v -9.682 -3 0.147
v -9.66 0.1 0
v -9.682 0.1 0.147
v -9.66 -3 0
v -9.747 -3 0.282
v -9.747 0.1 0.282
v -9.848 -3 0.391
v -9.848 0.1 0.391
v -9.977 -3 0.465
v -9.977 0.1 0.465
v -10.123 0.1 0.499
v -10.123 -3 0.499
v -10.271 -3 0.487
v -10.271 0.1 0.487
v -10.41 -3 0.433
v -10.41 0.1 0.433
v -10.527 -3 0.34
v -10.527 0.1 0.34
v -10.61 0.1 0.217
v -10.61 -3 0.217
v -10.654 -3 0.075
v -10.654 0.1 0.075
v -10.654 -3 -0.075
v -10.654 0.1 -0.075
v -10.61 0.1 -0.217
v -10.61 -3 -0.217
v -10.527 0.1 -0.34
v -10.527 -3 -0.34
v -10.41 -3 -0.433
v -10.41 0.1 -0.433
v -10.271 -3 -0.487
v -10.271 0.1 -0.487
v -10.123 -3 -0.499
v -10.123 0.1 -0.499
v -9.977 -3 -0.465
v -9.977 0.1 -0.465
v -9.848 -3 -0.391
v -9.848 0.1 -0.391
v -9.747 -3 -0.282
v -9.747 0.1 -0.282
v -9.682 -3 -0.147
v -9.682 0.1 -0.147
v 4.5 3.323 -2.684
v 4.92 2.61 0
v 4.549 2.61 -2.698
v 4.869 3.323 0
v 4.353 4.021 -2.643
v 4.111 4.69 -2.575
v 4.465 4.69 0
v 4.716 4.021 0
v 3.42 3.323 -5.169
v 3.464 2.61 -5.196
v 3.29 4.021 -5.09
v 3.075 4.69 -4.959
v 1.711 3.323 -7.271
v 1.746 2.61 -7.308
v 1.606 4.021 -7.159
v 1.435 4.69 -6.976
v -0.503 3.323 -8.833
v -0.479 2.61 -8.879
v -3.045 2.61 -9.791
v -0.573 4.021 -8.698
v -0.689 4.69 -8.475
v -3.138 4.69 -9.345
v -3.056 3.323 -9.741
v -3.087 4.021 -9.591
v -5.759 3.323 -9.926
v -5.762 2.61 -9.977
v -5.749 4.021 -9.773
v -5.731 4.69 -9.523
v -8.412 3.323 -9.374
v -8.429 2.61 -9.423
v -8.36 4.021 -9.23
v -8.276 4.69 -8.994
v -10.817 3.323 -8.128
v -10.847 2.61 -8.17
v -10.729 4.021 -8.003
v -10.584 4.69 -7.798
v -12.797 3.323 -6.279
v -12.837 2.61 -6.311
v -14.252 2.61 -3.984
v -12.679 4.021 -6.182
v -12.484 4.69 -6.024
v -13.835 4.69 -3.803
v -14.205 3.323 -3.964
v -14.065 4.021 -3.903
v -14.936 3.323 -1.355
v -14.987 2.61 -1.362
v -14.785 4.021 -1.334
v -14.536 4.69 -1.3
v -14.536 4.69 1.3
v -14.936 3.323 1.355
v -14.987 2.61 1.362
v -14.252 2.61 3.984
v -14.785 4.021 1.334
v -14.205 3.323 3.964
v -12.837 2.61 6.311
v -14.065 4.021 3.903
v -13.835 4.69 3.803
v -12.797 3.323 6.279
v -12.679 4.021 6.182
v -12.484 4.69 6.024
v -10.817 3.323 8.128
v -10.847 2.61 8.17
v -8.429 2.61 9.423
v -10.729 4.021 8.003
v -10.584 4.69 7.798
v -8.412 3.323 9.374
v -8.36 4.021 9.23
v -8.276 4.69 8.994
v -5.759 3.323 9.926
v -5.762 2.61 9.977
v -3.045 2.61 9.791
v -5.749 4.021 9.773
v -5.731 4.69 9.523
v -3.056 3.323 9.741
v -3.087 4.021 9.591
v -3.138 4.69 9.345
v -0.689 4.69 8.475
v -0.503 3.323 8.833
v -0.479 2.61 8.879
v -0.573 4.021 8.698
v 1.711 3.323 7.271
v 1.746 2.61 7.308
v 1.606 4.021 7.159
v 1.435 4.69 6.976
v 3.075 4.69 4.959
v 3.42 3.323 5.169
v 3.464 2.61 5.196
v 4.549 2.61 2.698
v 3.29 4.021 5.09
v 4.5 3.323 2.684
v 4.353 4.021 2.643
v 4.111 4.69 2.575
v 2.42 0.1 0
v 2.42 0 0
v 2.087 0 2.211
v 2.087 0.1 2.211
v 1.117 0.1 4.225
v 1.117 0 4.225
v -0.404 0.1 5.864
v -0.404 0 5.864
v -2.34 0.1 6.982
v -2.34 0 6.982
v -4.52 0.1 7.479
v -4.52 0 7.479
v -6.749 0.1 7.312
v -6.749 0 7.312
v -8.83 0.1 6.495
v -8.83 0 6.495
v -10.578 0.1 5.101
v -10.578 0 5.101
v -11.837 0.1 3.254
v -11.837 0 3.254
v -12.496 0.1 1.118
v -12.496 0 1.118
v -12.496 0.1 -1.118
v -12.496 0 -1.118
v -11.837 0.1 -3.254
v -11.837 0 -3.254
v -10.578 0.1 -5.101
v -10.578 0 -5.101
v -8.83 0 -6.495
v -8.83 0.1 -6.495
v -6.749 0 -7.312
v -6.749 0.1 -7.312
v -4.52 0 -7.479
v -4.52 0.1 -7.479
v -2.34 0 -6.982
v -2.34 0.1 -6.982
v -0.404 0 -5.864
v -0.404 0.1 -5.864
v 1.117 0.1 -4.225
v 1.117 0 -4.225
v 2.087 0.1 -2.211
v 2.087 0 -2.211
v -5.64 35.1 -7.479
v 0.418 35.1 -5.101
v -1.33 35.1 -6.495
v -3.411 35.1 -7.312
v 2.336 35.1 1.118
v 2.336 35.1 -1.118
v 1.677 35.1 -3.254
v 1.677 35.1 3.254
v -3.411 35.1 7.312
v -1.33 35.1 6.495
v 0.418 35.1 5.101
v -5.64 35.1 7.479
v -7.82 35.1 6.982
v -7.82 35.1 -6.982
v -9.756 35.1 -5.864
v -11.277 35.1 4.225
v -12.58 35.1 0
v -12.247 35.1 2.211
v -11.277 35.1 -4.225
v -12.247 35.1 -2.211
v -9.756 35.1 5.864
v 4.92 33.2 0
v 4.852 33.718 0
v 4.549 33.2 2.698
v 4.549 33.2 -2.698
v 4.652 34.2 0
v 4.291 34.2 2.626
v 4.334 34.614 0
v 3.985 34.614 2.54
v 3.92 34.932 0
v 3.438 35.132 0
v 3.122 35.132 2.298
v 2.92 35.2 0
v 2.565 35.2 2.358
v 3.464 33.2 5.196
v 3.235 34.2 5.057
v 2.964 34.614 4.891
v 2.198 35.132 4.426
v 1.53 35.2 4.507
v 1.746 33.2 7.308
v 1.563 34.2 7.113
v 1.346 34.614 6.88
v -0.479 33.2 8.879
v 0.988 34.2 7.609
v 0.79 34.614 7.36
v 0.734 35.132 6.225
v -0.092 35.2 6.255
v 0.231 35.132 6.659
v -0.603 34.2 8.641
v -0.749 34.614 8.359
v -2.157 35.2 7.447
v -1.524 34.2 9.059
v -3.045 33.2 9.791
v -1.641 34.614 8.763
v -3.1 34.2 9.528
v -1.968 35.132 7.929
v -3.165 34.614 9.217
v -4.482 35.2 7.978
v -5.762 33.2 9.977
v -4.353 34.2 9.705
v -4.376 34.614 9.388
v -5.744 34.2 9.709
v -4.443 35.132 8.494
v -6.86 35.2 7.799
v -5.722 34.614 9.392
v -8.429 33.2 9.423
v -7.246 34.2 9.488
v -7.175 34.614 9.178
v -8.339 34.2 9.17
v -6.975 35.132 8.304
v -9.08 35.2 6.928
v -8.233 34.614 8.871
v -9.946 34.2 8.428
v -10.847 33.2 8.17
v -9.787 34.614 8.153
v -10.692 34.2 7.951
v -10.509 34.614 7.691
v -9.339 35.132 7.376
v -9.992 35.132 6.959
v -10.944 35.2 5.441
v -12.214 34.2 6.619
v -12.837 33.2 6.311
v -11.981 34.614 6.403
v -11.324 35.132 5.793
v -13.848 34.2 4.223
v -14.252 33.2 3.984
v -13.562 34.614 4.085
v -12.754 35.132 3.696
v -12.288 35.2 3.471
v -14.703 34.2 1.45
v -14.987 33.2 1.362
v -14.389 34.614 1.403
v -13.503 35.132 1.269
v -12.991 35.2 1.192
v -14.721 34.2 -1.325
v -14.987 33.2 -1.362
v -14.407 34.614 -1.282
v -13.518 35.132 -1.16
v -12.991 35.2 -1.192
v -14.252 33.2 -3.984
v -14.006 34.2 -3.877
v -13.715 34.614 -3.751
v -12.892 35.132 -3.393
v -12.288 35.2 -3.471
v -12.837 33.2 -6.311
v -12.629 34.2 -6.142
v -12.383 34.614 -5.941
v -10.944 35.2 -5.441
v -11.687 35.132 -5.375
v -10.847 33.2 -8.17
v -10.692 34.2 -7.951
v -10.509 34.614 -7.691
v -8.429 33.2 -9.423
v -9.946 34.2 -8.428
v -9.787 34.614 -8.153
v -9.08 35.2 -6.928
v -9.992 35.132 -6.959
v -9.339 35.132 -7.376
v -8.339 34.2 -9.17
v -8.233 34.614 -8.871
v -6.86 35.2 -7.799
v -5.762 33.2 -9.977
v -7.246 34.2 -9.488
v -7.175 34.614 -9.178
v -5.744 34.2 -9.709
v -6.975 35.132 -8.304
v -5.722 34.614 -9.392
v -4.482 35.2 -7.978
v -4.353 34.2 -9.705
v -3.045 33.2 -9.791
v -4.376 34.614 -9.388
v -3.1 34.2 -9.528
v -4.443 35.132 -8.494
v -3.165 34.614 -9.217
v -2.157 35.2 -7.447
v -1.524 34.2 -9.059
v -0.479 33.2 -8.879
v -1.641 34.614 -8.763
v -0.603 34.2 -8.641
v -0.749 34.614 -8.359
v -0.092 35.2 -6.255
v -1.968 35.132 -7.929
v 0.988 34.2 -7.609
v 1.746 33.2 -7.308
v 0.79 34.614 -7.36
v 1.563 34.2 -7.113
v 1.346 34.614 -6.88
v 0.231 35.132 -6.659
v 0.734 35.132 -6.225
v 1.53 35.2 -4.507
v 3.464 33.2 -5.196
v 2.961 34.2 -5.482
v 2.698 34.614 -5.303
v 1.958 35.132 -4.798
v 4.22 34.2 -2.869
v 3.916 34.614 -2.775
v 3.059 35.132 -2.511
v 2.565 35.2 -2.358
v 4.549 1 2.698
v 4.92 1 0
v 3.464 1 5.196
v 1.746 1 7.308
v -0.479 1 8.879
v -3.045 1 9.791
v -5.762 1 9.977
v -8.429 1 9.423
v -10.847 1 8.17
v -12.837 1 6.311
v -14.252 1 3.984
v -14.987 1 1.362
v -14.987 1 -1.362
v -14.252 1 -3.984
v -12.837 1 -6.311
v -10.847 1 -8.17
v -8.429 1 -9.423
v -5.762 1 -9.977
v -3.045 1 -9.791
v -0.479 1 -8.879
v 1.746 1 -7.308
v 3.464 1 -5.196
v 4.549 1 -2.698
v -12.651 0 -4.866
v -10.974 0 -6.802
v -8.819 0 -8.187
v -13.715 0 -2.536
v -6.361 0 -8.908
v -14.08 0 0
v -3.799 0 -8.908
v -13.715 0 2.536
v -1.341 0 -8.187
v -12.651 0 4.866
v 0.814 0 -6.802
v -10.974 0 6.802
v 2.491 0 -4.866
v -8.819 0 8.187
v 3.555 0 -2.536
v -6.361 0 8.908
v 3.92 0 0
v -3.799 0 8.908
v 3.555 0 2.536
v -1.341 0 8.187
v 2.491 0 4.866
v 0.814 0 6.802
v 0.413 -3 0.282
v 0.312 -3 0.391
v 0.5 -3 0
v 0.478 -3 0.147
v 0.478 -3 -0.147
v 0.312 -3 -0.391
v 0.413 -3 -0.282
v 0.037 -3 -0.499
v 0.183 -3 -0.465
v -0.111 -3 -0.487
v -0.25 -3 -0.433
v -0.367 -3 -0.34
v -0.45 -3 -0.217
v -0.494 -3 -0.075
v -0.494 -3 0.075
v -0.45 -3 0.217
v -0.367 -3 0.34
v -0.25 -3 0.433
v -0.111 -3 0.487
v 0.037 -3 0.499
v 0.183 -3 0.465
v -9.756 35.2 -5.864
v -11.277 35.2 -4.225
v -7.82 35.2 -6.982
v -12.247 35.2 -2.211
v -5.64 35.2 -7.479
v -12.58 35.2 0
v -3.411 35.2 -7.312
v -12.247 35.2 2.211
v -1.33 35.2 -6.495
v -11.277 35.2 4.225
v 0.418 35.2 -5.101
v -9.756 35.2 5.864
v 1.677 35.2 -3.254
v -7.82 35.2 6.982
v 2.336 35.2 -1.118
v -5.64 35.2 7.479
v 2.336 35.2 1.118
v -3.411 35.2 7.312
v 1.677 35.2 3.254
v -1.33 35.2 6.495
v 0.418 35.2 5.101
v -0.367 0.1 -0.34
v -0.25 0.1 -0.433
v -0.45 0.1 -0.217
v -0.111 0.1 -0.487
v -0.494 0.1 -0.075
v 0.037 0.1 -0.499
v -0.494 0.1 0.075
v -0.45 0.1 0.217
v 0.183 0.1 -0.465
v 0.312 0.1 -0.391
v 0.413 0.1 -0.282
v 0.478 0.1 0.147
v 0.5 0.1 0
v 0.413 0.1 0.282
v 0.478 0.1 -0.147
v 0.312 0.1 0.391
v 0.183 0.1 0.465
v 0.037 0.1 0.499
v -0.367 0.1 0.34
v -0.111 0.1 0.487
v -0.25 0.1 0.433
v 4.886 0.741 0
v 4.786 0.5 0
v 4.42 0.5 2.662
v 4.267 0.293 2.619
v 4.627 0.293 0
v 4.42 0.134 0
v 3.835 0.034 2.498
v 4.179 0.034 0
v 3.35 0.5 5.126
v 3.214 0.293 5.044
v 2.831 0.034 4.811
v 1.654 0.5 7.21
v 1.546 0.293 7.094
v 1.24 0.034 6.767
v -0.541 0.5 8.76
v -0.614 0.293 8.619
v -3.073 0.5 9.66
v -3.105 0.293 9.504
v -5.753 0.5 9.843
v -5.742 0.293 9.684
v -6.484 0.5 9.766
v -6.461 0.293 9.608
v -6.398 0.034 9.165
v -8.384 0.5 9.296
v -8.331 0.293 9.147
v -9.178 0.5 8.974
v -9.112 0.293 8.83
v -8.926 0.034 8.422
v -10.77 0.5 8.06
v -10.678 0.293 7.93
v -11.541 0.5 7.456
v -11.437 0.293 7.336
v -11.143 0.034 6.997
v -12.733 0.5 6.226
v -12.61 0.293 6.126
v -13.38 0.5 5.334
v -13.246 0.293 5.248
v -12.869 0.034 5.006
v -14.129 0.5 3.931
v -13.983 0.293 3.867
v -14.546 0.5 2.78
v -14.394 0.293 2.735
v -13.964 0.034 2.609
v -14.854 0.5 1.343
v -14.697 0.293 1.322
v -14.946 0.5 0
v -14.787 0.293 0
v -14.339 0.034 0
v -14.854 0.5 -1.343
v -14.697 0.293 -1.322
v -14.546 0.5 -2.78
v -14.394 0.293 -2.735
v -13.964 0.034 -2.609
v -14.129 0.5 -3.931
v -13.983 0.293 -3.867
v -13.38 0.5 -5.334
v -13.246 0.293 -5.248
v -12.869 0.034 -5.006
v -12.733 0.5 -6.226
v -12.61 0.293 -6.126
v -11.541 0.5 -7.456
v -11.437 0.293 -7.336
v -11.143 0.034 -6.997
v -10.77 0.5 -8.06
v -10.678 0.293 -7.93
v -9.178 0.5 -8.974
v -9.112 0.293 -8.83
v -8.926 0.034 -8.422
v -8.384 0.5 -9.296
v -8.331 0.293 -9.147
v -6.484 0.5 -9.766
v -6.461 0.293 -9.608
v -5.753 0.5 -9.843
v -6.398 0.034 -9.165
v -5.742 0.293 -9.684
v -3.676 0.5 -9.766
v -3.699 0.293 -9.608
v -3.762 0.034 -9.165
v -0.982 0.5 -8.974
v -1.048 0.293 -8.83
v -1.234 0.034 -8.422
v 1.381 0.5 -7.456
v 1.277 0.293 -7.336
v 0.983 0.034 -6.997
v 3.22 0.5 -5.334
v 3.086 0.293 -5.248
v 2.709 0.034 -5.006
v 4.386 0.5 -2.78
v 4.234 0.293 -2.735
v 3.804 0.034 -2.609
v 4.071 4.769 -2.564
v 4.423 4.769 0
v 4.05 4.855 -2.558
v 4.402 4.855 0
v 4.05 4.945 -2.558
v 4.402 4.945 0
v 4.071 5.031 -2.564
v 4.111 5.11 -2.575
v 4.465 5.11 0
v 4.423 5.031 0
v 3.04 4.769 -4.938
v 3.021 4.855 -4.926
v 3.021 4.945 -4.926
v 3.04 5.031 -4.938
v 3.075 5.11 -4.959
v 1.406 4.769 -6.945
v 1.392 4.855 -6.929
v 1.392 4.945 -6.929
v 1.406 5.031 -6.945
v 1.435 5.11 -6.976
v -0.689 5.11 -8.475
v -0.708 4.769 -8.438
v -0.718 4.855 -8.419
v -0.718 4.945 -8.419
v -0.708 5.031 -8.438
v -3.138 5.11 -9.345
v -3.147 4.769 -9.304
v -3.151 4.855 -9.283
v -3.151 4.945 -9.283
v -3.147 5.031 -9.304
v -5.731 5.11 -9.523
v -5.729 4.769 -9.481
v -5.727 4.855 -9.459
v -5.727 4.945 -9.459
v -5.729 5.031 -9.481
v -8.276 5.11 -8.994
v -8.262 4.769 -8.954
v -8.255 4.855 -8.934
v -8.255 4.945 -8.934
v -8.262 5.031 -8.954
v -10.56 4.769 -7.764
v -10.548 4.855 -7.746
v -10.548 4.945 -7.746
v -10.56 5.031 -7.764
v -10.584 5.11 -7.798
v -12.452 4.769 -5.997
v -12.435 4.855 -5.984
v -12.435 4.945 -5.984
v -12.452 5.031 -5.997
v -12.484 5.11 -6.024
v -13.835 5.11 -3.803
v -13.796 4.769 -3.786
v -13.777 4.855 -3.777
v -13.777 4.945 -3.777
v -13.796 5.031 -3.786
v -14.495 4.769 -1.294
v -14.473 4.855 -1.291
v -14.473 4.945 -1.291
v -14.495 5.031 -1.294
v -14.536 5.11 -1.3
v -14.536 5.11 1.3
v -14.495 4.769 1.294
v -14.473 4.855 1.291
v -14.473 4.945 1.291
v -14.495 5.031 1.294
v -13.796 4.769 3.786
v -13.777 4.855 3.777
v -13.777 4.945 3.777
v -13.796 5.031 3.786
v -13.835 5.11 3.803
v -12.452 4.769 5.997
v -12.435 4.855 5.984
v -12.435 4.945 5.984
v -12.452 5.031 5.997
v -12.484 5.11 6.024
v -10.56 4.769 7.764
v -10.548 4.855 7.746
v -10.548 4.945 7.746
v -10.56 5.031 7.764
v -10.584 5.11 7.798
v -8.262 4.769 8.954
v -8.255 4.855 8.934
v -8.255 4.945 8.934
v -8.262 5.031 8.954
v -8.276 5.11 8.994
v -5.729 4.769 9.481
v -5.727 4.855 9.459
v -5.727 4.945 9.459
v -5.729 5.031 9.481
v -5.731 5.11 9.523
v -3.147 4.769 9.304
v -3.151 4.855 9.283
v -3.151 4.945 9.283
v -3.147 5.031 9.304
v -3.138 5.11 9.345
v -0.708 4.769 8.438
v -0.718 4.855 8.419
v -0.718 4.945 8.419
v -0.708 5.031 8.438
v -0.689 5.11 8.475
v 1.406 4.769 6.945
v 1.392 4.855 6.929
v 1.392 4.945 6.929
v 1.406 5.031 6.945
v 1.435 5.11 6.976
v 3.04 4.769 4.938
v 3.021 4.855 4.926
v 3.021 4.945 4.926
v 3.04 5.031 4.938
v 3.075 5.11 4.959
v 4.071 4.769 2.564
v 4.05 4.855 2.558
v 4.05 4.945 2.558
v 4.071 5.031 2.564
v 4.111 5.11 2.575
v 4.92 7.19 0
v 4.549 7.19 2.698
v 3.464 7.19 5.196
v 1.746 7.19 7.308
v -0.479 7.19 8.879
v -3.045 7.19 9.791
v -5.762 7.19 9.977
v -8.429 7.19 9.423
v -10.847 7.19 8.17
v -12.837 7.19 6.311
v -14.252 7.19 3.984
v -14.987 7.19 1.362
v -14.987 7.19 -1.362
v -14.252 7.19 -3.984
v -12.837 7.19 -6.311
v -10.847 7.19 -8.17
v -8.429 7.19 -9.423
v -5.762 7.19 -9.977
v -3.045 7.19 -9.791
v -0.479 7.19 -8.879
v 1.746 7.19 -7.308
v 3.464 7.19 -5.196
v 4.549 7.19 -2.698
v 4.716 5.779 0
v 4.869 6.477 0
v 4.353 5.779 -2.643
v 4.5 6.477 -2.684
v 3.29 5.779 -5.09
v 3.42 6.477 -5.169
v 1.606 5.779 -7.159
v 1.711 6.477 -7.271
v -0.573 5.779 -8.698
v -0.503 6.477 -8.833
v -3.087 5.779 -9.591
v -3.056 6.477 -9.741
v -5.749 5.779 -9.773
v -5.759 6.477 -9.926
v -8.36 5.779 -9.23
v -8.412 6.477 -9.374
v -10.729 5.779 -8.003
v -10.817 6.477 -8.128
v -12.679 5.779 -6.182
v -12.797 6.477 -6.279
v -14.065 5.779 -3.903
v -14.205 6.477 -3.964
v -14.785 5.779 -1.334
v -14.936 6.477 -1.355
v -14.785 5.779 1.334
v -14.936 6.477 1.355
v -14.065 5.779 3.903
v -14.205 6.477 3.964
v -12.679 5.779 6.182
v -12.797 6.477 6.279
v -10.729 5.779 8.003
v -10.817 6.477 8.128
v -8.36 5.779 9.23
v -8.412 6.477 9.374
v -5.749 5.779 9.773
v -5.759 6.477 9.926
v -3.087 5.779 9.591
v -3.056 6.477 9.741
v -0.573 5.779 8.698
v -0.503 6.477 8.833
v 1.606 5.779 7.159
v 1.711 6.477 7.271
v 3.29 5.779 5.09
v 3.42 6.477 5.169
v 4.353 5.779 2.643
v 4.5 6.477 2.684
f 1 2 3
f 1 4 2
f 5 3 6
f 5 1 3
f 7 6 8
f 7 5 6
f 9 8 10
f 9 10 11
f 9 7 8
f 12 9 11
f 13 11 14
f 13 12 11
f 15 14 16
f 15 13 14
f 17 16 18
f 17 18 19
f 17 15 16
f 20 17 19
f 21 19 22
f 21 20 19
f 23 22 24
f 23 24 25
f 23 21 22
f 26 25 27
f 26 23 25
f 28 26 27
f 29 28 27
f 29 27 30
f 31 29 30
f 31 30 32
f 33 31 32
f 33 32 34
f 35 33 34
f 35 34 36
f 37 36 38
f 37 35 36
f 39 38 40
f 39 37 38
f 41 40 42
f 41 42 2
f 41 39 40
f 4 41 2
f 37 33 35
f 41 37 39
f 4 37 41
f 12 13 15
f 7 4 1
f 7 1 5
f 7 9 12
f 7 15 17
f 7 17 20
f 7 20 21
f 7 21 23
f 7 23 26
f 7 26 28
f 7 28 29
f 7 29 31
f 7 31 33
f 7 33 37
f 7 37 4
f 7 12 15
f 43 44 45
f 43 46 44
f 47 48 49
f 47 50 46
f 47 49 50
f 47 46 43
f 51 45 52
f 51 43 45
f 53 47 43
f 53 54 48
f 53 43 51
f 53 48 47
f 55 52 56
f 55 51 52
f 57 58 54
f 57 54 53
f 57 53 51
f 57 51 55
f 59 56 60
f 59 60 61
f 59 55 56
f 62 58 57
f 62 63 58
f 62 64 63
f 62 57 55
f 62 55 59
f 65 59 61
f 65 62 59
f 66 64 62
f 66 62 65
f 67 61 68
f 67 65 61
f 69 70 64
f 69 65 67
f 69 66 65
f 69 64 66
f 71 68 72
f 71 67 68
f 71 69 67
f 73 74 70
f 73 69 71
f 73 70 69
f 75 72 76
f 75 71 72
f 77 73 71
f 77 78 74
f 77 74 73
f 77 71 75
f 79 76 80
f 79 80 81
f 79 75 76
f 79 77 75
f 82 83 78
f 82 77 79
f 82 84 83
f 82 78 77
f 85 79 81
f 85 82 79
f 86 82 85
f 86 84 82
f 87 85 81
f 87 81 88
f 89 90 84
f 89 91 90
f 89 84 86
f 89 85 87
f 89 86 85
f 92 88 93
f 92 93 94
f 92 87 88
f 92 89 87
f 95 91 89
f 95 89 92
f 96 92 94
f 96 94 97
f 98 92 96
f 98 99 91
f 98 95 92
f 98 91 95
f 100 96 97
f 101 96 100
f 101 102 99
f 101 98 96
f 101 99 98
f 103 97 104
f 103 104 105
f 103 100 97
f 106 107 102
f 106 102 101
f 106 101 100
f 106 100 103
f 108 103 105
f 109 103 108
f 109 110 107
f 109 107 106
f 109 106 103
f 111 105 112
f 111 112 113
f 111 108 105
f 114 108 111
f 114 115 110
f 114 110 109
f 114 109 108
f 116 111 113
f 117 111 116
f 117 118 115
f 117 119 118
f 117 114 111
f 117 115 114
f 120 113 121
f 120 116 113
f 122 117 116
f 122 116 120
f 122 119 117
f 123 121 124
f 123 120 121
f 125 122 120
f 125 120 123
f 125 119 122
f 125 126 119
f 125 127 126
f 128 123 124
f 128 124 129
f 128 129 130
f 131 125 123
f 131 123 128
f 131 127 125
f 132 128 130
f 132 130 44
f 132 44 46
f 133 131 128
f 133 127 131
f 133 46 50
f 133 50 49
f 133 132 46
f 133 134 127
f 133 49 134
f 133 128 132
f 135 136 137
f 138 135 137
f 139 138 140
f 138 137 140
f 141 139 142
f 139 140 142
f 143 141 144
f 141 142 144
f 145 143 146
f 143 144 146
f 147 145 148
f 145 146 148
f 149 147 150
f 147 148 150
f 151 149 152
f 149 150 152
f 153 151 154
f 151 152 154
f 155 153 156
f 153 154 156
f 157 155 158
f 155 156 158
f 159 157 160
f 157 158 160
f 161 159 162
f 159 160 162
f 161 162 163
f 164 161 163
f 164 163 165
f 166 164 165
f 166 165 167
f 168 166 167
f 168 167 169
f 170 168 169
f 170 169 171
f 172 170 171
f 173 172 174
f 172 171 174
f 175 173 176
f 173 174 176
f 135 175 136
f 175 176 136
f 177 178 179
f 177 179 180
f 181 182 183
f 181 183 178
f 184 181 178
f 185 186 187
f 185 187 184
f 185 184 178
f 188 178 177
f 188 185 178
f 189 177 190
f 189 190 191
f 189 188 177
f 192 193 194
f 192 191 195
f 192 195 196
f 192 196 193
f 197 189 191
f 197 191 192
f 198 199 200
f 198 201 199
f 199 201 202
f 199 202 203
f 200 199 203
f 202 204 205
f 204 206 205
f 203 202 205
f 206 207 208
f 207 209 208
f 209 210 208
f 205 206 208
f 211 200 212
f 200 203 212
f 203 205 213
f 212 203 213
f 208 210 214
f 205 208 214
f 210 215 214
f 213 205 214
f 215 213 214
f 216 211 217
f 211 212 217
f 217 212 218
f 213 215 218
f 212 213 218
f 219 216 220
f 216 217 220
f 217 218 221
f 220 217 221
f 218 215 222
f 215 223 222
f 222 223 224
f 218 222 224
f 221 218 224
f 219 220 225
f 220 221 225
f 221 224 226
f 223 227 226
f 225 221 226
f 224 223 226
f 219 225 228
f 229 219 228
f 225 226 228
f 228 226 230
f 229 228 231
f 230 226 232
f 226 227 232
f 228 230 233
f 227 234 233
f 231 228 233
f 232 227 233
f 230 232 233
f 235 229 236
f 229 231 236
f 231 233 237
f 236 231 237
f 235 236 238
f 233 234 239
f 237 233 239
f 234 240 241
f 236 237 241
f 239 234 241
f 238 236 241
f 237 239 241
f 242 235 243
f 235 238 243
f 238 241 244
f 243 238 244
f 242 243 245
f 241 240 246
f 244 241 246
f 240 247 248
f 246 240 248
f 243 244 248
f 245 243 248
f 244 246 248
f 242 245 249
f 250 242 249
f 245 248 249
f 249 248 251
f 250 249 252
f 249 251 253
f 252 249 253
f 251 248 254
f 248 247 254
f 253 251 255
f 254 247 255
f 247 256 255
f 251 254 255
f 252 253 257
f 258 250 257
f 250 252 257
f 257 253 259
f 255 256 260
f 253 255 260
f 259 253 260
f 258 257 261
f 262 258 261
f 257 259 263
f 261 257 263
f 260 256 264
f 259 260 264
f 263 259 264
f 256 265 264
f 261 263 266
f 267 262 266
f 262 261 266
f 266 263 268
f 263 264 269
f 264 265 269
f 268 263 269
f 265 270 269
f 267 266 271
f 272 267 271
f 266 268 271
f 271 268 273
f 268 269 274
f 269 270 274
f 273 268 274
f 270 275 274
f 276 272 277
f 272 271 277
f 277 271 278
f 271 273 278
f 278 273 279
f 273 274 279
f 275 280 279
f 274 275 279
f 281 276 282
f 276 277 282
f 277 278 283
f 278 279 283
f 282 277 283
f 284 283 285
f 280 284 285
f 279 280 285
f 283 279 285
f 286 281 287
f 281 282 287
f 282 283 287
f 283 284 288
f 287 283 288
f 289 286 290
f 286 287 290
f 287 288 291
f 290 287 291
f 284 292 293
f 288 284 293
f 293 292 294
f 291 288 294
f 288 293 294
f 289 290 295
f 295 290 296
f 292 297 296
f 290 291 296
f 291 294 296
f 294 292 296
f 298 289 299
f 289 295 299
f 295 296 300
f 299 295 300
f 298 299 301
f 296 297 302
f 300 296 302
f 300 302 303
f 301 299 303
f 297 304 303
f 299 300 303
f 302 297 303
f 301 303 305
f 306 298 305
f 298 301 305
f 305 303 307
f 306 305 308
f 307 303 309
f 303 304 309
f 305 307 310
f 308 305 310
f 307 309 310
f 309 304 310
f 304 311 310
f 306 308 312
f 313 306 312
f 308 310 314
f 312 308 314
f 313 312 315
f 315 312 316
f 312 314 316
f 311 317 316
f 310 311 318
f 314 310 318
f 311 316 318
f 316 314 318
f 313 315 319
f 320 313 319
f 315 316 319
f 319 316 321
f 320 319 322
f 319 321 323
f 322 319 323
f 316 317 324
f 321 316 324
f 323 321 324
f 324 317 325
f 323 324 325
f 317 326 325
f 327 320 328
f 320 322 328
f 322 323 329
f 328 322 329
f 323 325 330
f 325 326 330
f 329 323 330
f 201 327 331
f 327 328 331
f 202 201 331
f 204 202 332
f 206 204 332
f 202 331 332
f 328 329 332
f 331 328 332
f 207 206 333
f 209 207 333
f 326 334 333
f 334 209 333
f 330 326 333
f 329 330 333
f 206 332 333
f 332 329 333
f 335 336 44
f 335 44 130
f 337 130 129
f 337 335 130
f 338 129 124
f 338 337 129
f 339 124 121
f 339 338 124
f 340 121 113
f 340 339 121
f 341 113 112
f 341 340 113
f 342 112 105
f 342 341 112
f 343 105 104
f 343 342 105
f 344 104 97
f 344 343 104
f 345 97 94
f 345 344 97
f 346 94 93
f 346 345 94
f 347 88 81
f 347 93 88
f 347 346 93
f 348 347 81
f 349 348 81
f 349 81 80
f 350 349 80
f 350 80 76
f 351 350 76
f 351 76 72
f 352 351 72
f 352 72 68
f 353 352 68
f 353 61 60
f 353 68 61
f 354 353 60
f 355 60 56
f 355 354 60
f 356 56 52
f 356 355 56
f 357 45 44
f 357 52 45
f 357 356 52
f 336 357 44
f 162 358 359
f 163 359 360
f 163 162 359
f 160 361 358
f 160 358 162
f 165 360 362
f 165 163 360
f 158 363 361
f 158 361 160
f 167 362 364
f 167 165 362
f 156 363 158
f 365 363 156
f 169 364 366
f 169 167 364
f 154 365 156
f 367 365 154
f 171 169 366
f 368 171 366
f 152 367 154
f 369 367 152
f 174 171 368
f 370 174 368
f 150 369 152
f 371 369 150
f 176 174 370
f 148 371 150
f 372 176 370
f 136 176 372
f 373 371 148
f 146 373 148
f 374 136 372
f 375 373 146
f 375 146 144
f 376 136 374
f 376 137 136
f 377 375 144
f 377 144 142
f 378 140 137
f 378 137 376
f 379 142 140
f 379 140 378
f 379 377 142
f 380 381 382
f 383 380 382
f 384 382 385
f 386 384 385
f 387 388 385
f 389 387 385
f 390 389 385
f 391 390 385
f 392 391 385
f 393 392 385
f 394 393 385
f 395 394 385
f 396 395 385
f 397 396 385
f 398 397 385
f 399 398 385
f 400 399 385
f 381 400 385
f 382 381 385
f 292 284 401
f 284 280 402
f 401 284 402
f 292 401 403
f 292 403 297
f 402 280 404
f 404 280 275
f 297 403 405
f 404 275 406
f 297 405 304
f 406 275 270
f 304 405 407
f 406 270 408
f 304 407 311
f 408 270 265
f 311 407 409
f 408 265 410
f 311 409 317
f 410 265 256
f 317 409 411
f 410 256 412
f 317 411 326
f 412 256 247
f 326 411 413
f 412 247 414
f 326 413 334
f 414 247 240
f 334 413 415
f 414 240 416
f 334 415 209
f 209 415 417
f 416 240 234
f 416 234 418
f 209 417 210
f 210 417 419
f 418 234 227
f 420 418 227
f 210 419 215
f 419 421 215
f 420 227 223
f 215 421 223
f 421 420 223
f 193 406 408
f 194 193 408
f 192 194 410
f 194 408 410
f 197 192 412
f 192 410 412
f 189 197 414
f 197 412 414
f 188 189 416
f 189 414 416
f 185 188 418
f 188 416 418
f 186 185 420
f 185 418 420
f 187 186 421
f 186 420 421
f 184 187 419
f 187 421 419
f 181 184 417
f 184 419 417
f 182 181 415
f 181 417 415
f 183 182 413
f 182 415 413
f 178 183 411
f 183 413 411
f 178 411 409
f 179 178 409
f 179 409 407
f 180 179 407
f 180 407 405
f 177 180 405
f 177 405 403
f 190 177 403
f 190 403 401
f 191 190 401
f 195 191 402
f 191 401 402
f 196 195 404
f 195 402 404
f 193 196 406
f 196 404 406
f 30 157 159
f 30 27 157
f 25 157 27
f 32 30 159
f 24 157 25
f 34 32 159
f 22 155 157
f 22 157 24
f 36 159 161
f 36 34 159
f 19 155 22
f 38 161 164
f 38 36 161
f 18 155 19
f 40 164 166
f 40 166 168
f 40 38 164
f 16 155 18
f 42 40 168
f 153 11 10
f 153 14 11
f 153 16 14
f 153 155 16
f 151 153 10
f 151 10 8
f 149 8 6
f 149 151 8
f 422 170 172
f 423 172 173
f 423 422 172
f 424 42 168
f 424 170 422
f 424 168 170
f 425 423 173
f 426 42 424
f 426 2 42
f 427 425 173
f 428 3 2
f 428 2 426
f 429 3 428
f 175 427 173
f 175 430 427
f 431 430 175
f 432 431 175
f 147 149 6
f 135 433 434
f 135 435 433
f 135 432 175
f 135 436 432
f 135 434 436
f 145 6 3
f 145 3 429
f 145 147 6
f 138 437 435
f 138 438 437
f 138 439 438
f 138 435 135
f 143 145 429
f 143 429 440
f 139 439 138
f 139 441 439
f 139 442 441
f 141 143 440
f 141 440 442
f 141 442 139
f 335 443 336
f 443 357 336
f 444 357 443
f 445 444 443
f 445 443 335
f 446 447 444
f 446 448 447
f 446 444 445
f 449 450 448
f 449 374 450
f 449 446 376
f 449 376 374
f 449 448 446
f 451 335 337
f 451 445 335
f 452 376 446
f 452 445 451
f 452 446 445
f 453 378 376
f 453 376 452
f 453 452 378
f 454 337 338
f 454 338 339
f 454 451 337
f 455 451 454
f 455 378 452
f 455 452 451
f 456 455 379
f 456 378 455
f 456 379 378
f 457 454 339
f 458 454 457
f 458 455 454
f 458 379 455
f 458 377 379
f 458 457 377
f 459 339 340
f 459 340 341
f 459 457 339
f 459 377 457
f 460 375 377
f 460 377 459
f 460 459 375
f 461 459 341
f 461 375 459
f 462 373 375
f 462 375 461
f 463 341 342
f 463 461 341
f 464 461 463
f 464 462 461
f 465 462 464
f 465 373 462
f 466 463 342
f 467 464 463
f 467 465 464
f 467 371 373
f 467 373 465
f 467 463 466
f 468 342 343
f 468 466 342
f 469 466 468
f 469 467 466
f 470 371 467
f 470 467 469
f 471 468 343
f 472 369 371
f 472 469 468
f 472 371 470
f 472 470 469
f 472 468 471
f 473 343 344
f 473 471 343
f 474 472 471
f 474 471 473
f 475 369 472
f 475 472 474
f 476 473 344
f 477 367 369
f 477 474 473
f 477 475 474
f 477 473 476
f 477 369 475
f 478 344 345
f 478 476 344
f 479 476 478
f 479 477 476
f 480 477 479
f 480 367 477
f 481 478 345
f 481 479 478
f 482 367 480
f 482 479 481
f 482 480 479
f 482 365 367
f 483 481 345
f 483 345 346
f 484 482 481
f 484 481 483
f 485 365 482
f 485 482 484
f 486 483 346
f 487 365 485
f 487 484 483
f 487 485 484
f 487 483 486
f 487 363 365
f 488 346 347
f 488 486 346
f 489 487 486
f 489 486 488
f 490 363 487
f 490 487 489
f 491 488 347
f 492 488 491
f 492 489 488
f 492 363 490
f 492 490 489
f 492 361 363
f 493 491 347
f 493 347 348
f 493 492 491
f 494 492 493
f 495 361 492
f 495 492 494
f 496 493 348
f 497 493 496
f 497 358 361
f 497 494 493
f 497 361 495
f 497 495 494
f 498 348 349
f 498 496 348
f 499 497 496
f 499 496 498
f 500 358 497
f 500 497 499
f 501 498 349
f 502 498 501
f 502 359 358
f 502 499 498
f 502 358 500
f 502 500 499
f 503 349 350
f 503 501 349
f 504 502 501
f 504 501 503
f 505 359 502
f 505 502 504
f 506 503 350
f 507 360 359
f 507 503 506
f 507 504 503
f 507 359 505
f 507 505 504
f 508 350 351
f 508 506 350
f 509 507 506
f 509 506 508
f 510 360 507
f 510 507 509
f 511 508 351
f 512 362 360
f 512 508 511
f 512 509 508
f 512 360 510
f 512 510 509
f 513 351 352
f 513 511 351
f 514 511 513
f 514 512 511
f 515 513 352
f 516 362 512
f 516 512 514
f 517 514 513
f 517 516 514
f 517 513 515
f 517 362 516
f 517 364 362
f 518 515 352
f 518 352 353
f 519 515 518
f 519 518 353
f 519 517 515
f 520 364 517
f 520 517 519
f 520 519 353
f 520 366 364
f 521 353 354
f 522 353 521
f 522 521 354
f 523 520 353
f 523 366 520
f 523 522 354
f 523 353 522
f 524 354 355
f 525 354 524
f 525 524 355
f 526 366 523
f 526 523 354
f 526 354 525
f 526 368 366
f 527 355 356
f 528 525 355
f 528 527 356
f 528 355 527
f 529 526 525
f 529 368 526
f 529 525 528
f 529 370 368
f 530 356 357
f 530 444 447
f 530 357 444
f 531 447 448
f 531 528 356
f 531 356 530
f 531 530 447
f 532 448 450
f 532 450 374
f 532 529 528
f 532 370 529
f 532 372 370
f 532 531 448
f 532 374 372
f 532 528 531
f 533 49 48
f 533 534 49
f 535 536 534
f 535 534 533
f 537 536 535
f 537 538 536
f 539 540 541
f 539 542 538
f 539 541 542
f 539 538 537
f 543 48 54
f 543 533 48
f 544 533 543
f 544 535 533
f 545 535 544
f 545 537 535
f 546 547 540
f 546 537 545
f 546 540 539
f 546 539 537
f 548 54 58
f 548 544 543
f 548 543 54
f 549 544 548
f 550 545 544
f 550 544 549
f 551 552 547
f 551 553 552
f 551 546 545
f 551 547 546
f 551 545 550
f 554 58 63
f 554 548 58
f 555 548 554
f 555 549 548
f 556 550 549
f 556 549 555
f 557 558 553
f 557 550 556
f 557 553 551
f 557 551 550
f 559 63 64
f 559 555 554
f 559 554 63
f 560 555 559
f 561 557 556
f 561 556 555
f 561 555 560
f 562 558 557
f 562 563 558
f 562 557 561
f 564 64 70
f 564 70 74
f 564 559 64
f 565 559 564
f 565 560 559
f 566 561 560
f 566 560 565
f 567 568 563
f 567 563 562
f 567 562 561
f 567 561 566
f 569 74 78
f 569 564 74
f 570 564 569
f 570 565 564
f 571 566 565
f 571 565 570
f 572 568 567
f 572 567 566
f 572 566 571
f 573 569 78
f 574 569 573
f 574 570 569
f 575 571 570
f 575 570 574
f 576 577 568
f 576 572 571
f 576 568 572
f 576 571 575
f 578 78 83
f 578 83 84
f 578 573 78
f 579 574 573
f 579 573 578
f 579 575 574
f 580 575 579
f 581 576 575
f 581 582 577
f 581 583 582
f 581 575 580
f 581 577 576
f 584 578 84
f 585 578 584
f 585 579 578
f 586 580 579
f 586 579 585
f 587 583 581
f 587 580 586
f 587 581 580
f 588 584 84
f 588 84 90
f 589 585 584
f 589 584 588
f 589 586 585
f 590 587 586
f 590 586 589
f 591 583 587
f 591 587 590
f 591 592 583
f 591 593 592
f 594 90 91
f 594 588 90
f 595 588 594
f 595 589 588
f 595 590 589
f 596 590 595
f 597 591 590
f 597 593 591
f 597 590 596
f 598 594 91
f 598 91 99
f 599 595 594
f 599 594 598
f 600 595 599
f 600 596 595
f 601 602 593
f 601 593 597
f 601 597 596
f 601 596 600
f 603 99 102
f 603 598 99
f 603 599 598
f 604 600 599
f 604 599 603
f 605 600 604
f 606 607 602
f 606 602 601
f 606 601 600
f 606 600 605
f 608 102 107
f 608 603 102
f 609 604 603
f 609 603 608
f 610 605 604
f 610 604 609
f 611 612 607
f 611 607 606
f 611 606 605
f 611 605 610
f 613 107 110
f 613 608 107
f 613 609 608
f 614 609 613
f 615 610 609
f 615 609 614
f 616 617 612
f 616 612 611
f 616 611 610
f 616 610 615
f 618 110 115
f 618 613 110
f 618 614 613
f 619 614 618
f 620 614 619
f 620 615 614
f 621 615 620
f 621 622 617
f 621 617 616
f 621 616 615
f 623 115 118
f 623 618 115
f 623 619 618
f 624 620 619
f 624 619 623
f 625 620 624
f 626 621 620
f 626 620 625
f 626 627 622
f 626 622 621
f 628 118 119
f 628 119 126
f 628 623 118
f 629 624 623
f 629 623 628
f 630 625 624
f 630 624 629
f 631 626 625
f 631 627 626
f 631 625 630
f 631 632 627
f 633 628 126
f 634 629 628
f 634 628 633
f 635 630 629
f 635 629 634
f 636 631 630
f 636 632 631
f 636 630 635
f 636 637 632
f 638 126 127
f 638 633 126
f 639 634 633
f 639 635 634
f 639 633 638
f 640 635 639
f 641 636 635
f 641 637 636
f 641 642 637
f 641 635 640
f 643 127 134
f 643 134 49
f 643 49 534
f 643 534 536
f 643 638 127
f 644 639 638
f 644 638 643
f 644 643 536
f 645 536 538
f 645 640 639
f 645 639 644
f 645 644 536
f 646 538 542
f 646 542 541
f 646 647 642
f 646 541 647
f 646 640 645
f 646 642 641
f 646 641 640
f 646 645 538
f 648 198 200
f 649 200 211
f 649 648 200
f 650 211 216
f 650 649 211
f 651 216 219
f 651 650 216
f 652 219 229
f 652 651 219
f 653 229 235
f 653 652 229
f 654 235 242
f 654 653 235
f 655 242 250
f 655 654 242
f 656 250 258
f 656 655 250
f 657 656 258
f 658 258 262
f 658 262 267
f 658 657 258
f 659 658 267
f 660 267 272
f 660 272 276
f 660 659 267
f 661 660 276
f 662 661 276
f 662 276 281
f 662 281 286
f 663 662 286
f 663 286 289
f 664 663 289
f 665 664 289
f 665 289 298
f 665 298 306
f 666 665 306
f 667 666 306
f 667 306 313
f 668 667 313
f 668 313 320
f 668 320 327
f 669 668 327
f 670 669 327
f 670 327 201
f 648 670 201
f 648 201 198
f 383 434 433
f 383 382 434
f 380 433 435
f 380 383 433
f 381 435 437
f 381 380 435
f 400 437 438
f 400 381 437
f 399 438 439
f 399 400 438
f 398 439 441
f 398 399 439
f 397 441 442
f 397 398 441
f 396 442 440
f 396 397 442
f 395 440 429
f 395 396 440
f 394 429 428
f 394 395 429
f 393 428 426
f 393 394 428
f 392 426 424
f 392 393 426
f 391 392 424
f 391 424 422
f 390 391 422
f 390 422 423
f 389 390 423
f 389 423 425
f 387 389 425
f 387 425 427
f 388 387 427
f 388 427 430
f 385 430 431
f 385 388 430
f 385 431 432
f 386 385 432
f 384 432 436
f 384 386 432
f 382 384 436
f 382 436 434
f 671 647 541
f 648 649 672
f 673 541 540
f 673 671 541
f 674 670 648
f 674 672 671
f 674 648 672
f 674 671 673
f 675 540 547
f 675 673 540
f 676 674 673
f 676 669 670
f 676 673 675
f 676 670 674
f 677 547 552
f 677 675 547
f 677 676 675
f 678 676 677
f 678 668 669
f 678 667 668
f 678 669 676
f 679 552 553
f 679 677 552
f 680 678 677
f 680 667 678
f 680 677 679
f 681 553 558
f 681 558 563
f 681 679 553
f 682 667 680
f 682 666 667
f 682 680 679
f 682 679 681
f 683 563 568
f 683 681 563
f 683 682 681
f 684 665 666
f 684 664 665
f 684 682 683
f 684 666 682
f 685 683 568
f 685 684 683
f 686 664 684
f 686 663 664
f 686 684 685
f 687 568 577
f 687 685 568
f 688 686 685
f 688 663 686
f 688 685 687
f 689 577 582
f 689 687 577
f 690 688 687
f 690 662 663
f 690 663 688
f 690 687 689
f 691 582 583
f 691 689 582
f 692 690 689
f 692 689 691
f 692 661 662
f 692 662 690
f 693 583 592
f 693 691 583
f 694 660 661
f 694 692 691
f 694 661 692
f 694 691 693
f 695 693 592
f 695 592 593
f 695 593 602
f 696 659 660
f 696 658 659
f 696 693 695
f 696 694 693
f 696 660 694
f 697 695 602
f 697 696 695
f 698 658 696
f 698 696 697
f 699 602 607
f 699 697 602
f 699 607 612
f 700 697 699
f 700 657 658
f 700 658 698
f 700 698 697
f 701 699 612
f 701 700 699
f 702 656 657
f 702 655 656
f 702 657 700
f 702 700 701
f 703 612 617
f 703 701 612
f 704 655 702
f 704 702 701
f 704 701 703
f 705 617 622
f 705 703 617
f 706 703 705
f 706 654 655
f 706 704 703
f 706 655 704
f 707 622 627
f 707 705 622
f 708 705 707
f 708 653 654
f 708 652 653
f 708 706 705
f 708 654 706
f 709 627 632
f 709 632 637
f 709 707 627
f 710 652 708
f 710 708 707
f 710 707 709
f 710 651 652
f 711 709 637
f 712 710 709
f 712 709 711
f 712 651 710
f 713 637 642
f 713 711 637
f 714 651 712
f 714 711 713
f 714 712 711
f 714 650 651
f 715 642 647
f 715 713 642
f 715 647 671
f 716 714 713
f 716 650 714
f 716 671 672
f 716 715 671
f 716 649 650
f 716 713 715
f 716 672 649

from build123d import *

# Parameters (mm, degrees)
SKETCH1_R           = 0.5
BASE_EXTRUDE_DEPTH  = 3
SKETCH2_R           = 7.5
BOSS_EXTRUDE1_DEPTH = 0.690752369
SKETCH3_R           = 0.5
BOSS_EXTRUDE2_DEPTH = 3
SKETCH4_R           = 10
BOSS_EXTRUDE3_DEPTH = 35.2
SKETCH5_R           = 7.5
SKETCH5_R_2         = 0.5
CUT_EXTRUDE1_DEPTH  = 0.1
FILLET1_R           = 2
FILLET2_R           = 1
SKETCH7_R           = 7.5
CUT_EXTRUDE2_DEPTH  = 0.1


with BuildPart() as part:
    # Sketch1 → Base-Extrude (new body)
    with BuildSketch(Plane(origin=(0, 0, 0), x_dir=(1, 0, 0), z_dir=(0, 1, 0))):
        Circle(SKETCH1_R)
    extrude(amount=-BASE_EXTRUDE_DEPTH)

    # Sketch2 → Boss-Extrude1 (add)
    with BuildSketch(Plane(origin=(0, 0, 0), x_dir=(1, 0, 0), z_dir=(0, 1, 0))):
        with Locations((-5.08, 0)):
            Circle(SKETCH2_R)
    extrude(amount=BOSS_EXTRUDE1_DEPTH)

    # Sketch3 → Boss-Extrude2 (add)
    with BuildSketch(Plane.XZ):
        with Locations((-10.16, 0)):
            Circle(SKETCH3_R)
    extrude(amount=BOSS_EXTRUDE2_DEPTH)

    # Sketch4 → Boss-Extrude3 (add)
    with BuildSketch(Plane.XZ):
        with Locations((-5.08, 0)):
            Circle(SKETCH4_R)
    extrude(amount=-BOSS_EXTRUDE3_DEPTH)

    # Sketch5 → Cut-Extrude1 (cut)
    with BuildSketch(Plane.XZ):
        with Locations((-5.08, 0)):
            Circle(SKETCH5_R)
        Circle(SKETCH5_R_2, mode=Mode.SUBTRACT)
        with Locations((-10.16, 0)):
            Circle(SKETCH5_R_2, mode=Mode.SUBTRACT)
    extrude(amount=-CUT_EXTRUDE1_DEPTH, mode=Mode.SUBTRACT)

    # Fillet1
    fillet1_edges = [part.edges().sort_by_distance(p)[0] for p in [
        (-15.08, 35.2, 0),
    ]]
    fillet(fillet1_edges, radius=FILLET1_R)

    # Fillet2
    fillet2_edges = [part.edges().sort_by_distance(p)[0] for p in [
        (-15.08, 0, 0),
    ]]
    fillet(fillet2_edges, radius=FILLET2_R)

    # Sketch6 → Cut-Revolve1 (revolve, cut)
    with BuildSketch(Plane.XY):
        with BuildLine():
            Line((4.92, 7.19), (5.42, 7.19))
            Line((5.42, 7.19), (5.42, 2.61))
            Line((5.42, 2.61), (4.92, 2.61))
            ThreePointArc((4.92, 2.61), (4.804920837, 3.674592058), (4.465, 4.69))
            ThreePointArc((4.465, 4.69), (4.398803332, 4.9), (4.465, 5.11))
            ThreePointArc((4.465, 5.11), (4.804920837, 6.125407942), (4.92, 7.19))
        make_face()
    revolve(axis=Axis((-5.08, 0, 0), (0, 1, 0)), mode=Mode.SUBTRACT)

    # Sketch7 → Cut-Extrude2 (cut)
    with BuildSketch(Plane(origin=(0, 35.2, 0), x_dir=(-1, 0, 0), z_dir=(0, 1, 0))):
        with Locations((5.08, 0)):
            Circle(SKETCH7_R)
    extrude(amount=-CUT_EXTRUDE2_DEPTH, mode=Mode.SUBTRACT)


solid = part.part
